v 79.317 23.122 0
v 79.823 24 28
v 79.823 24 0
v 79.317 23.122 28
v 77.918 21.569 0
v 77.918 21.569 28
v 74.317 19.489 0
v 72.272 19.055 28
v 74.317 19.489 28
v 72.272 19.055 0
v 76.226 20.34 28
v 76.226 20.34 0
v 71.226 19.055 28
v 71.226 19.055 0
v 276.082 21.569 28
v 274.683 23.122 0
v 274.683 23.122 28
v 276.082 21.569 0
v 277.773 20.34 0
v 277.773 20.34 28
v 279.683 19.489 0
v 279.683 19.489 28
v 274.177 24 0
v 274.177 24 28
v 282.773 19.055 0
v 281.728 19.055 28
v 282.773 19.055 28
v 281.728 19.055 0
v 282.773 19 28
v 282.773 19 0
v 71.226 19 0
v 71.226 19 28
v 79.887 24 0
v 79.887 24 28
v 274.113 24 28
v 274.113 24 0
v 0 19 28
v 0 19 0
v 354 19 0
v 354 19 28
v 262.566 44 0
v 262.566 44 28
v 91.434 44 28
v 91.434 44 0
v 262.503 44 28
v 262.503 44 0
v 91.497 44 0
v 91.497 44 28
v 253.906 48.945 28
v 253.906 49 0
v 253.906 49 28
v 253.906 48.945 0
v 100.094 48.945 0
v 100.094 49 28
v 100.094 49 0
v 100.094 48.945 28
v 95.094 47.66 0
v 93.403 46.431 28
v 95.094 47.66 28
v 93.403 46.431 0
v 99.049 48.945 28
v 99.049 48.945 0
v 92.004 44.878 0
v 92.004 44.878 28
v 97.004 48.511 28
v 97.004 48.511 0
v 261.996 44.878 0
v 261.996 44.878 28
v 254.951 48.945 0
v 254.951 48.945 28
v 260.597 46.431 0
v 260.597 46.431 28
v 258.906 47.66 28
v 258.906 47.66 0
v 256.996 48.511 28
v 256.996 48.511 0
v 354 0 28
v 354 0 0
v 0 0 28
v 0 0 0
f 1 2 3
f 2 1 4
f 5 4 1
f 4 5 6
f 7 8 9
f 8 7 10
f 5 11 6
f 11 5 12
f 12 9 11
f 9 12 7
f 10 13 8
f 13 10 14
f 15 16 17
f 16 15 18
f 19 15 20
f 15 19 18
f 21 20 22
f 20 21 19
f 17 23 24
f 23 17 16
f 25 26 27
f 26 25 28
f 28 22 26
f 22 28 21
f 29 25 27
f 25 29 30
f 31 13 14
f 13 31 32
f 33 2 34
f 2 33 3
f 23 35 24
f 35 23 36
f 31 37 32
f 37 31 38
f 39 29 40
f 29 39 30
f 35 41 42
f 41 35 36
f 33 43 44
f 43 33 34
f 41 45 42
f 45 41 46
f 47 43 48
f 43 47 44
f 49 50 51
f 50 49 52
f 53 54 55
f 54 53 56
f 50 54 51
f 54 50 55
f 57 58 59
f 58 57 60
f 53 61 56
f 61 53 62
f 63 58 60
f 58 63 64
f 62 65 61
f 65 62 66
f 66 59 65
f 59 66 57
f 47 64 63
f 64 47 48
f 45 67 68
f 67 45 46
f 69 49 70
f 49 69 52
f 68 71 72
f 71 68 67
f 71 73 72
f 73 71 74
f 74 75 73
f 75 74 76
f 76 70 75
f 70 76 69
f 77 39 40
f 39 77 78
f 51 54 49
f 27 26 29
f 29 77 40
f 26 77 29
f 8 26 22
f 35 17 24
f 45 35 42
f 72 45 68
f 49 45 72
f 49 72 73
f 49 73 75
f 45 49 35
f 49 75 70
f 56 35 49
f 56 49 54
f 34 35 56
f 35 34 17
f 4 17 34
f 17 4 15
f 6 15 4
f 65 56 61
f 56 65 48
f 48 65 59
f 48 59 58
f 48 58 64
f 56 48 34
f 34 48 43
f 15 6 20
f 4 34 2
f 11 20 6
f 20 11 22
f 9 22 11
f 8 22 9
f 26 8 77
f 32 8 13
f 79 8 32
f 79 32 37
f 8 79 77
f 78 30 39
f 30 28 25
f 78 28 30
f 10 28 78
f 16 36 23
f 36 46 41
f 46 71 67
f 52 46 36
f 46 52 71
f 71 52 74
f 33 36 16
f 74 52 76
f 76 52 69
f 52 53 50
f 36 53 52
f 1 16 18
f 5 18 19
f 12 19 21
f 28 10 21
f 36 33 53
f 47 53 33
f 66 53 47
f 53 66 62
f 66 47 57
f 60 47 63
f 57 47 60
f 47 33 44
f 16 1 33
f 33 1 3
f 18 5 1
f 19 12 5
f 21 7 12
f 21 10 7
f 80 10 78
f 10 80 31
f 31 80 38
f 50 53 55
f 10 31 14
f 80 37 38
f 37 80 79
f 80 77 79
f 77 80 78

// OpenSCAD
include <../src/wardrobe.scad>;
plank_yz_middle_top();
//github_openscad -o wardrobe_2/plank_yz_middle_top.stl -D wardrobe_n=2 -D cutting_edge=0 -D break_view_length=0 wardrobe_2/plank_yz_middle_top_stl.scad
